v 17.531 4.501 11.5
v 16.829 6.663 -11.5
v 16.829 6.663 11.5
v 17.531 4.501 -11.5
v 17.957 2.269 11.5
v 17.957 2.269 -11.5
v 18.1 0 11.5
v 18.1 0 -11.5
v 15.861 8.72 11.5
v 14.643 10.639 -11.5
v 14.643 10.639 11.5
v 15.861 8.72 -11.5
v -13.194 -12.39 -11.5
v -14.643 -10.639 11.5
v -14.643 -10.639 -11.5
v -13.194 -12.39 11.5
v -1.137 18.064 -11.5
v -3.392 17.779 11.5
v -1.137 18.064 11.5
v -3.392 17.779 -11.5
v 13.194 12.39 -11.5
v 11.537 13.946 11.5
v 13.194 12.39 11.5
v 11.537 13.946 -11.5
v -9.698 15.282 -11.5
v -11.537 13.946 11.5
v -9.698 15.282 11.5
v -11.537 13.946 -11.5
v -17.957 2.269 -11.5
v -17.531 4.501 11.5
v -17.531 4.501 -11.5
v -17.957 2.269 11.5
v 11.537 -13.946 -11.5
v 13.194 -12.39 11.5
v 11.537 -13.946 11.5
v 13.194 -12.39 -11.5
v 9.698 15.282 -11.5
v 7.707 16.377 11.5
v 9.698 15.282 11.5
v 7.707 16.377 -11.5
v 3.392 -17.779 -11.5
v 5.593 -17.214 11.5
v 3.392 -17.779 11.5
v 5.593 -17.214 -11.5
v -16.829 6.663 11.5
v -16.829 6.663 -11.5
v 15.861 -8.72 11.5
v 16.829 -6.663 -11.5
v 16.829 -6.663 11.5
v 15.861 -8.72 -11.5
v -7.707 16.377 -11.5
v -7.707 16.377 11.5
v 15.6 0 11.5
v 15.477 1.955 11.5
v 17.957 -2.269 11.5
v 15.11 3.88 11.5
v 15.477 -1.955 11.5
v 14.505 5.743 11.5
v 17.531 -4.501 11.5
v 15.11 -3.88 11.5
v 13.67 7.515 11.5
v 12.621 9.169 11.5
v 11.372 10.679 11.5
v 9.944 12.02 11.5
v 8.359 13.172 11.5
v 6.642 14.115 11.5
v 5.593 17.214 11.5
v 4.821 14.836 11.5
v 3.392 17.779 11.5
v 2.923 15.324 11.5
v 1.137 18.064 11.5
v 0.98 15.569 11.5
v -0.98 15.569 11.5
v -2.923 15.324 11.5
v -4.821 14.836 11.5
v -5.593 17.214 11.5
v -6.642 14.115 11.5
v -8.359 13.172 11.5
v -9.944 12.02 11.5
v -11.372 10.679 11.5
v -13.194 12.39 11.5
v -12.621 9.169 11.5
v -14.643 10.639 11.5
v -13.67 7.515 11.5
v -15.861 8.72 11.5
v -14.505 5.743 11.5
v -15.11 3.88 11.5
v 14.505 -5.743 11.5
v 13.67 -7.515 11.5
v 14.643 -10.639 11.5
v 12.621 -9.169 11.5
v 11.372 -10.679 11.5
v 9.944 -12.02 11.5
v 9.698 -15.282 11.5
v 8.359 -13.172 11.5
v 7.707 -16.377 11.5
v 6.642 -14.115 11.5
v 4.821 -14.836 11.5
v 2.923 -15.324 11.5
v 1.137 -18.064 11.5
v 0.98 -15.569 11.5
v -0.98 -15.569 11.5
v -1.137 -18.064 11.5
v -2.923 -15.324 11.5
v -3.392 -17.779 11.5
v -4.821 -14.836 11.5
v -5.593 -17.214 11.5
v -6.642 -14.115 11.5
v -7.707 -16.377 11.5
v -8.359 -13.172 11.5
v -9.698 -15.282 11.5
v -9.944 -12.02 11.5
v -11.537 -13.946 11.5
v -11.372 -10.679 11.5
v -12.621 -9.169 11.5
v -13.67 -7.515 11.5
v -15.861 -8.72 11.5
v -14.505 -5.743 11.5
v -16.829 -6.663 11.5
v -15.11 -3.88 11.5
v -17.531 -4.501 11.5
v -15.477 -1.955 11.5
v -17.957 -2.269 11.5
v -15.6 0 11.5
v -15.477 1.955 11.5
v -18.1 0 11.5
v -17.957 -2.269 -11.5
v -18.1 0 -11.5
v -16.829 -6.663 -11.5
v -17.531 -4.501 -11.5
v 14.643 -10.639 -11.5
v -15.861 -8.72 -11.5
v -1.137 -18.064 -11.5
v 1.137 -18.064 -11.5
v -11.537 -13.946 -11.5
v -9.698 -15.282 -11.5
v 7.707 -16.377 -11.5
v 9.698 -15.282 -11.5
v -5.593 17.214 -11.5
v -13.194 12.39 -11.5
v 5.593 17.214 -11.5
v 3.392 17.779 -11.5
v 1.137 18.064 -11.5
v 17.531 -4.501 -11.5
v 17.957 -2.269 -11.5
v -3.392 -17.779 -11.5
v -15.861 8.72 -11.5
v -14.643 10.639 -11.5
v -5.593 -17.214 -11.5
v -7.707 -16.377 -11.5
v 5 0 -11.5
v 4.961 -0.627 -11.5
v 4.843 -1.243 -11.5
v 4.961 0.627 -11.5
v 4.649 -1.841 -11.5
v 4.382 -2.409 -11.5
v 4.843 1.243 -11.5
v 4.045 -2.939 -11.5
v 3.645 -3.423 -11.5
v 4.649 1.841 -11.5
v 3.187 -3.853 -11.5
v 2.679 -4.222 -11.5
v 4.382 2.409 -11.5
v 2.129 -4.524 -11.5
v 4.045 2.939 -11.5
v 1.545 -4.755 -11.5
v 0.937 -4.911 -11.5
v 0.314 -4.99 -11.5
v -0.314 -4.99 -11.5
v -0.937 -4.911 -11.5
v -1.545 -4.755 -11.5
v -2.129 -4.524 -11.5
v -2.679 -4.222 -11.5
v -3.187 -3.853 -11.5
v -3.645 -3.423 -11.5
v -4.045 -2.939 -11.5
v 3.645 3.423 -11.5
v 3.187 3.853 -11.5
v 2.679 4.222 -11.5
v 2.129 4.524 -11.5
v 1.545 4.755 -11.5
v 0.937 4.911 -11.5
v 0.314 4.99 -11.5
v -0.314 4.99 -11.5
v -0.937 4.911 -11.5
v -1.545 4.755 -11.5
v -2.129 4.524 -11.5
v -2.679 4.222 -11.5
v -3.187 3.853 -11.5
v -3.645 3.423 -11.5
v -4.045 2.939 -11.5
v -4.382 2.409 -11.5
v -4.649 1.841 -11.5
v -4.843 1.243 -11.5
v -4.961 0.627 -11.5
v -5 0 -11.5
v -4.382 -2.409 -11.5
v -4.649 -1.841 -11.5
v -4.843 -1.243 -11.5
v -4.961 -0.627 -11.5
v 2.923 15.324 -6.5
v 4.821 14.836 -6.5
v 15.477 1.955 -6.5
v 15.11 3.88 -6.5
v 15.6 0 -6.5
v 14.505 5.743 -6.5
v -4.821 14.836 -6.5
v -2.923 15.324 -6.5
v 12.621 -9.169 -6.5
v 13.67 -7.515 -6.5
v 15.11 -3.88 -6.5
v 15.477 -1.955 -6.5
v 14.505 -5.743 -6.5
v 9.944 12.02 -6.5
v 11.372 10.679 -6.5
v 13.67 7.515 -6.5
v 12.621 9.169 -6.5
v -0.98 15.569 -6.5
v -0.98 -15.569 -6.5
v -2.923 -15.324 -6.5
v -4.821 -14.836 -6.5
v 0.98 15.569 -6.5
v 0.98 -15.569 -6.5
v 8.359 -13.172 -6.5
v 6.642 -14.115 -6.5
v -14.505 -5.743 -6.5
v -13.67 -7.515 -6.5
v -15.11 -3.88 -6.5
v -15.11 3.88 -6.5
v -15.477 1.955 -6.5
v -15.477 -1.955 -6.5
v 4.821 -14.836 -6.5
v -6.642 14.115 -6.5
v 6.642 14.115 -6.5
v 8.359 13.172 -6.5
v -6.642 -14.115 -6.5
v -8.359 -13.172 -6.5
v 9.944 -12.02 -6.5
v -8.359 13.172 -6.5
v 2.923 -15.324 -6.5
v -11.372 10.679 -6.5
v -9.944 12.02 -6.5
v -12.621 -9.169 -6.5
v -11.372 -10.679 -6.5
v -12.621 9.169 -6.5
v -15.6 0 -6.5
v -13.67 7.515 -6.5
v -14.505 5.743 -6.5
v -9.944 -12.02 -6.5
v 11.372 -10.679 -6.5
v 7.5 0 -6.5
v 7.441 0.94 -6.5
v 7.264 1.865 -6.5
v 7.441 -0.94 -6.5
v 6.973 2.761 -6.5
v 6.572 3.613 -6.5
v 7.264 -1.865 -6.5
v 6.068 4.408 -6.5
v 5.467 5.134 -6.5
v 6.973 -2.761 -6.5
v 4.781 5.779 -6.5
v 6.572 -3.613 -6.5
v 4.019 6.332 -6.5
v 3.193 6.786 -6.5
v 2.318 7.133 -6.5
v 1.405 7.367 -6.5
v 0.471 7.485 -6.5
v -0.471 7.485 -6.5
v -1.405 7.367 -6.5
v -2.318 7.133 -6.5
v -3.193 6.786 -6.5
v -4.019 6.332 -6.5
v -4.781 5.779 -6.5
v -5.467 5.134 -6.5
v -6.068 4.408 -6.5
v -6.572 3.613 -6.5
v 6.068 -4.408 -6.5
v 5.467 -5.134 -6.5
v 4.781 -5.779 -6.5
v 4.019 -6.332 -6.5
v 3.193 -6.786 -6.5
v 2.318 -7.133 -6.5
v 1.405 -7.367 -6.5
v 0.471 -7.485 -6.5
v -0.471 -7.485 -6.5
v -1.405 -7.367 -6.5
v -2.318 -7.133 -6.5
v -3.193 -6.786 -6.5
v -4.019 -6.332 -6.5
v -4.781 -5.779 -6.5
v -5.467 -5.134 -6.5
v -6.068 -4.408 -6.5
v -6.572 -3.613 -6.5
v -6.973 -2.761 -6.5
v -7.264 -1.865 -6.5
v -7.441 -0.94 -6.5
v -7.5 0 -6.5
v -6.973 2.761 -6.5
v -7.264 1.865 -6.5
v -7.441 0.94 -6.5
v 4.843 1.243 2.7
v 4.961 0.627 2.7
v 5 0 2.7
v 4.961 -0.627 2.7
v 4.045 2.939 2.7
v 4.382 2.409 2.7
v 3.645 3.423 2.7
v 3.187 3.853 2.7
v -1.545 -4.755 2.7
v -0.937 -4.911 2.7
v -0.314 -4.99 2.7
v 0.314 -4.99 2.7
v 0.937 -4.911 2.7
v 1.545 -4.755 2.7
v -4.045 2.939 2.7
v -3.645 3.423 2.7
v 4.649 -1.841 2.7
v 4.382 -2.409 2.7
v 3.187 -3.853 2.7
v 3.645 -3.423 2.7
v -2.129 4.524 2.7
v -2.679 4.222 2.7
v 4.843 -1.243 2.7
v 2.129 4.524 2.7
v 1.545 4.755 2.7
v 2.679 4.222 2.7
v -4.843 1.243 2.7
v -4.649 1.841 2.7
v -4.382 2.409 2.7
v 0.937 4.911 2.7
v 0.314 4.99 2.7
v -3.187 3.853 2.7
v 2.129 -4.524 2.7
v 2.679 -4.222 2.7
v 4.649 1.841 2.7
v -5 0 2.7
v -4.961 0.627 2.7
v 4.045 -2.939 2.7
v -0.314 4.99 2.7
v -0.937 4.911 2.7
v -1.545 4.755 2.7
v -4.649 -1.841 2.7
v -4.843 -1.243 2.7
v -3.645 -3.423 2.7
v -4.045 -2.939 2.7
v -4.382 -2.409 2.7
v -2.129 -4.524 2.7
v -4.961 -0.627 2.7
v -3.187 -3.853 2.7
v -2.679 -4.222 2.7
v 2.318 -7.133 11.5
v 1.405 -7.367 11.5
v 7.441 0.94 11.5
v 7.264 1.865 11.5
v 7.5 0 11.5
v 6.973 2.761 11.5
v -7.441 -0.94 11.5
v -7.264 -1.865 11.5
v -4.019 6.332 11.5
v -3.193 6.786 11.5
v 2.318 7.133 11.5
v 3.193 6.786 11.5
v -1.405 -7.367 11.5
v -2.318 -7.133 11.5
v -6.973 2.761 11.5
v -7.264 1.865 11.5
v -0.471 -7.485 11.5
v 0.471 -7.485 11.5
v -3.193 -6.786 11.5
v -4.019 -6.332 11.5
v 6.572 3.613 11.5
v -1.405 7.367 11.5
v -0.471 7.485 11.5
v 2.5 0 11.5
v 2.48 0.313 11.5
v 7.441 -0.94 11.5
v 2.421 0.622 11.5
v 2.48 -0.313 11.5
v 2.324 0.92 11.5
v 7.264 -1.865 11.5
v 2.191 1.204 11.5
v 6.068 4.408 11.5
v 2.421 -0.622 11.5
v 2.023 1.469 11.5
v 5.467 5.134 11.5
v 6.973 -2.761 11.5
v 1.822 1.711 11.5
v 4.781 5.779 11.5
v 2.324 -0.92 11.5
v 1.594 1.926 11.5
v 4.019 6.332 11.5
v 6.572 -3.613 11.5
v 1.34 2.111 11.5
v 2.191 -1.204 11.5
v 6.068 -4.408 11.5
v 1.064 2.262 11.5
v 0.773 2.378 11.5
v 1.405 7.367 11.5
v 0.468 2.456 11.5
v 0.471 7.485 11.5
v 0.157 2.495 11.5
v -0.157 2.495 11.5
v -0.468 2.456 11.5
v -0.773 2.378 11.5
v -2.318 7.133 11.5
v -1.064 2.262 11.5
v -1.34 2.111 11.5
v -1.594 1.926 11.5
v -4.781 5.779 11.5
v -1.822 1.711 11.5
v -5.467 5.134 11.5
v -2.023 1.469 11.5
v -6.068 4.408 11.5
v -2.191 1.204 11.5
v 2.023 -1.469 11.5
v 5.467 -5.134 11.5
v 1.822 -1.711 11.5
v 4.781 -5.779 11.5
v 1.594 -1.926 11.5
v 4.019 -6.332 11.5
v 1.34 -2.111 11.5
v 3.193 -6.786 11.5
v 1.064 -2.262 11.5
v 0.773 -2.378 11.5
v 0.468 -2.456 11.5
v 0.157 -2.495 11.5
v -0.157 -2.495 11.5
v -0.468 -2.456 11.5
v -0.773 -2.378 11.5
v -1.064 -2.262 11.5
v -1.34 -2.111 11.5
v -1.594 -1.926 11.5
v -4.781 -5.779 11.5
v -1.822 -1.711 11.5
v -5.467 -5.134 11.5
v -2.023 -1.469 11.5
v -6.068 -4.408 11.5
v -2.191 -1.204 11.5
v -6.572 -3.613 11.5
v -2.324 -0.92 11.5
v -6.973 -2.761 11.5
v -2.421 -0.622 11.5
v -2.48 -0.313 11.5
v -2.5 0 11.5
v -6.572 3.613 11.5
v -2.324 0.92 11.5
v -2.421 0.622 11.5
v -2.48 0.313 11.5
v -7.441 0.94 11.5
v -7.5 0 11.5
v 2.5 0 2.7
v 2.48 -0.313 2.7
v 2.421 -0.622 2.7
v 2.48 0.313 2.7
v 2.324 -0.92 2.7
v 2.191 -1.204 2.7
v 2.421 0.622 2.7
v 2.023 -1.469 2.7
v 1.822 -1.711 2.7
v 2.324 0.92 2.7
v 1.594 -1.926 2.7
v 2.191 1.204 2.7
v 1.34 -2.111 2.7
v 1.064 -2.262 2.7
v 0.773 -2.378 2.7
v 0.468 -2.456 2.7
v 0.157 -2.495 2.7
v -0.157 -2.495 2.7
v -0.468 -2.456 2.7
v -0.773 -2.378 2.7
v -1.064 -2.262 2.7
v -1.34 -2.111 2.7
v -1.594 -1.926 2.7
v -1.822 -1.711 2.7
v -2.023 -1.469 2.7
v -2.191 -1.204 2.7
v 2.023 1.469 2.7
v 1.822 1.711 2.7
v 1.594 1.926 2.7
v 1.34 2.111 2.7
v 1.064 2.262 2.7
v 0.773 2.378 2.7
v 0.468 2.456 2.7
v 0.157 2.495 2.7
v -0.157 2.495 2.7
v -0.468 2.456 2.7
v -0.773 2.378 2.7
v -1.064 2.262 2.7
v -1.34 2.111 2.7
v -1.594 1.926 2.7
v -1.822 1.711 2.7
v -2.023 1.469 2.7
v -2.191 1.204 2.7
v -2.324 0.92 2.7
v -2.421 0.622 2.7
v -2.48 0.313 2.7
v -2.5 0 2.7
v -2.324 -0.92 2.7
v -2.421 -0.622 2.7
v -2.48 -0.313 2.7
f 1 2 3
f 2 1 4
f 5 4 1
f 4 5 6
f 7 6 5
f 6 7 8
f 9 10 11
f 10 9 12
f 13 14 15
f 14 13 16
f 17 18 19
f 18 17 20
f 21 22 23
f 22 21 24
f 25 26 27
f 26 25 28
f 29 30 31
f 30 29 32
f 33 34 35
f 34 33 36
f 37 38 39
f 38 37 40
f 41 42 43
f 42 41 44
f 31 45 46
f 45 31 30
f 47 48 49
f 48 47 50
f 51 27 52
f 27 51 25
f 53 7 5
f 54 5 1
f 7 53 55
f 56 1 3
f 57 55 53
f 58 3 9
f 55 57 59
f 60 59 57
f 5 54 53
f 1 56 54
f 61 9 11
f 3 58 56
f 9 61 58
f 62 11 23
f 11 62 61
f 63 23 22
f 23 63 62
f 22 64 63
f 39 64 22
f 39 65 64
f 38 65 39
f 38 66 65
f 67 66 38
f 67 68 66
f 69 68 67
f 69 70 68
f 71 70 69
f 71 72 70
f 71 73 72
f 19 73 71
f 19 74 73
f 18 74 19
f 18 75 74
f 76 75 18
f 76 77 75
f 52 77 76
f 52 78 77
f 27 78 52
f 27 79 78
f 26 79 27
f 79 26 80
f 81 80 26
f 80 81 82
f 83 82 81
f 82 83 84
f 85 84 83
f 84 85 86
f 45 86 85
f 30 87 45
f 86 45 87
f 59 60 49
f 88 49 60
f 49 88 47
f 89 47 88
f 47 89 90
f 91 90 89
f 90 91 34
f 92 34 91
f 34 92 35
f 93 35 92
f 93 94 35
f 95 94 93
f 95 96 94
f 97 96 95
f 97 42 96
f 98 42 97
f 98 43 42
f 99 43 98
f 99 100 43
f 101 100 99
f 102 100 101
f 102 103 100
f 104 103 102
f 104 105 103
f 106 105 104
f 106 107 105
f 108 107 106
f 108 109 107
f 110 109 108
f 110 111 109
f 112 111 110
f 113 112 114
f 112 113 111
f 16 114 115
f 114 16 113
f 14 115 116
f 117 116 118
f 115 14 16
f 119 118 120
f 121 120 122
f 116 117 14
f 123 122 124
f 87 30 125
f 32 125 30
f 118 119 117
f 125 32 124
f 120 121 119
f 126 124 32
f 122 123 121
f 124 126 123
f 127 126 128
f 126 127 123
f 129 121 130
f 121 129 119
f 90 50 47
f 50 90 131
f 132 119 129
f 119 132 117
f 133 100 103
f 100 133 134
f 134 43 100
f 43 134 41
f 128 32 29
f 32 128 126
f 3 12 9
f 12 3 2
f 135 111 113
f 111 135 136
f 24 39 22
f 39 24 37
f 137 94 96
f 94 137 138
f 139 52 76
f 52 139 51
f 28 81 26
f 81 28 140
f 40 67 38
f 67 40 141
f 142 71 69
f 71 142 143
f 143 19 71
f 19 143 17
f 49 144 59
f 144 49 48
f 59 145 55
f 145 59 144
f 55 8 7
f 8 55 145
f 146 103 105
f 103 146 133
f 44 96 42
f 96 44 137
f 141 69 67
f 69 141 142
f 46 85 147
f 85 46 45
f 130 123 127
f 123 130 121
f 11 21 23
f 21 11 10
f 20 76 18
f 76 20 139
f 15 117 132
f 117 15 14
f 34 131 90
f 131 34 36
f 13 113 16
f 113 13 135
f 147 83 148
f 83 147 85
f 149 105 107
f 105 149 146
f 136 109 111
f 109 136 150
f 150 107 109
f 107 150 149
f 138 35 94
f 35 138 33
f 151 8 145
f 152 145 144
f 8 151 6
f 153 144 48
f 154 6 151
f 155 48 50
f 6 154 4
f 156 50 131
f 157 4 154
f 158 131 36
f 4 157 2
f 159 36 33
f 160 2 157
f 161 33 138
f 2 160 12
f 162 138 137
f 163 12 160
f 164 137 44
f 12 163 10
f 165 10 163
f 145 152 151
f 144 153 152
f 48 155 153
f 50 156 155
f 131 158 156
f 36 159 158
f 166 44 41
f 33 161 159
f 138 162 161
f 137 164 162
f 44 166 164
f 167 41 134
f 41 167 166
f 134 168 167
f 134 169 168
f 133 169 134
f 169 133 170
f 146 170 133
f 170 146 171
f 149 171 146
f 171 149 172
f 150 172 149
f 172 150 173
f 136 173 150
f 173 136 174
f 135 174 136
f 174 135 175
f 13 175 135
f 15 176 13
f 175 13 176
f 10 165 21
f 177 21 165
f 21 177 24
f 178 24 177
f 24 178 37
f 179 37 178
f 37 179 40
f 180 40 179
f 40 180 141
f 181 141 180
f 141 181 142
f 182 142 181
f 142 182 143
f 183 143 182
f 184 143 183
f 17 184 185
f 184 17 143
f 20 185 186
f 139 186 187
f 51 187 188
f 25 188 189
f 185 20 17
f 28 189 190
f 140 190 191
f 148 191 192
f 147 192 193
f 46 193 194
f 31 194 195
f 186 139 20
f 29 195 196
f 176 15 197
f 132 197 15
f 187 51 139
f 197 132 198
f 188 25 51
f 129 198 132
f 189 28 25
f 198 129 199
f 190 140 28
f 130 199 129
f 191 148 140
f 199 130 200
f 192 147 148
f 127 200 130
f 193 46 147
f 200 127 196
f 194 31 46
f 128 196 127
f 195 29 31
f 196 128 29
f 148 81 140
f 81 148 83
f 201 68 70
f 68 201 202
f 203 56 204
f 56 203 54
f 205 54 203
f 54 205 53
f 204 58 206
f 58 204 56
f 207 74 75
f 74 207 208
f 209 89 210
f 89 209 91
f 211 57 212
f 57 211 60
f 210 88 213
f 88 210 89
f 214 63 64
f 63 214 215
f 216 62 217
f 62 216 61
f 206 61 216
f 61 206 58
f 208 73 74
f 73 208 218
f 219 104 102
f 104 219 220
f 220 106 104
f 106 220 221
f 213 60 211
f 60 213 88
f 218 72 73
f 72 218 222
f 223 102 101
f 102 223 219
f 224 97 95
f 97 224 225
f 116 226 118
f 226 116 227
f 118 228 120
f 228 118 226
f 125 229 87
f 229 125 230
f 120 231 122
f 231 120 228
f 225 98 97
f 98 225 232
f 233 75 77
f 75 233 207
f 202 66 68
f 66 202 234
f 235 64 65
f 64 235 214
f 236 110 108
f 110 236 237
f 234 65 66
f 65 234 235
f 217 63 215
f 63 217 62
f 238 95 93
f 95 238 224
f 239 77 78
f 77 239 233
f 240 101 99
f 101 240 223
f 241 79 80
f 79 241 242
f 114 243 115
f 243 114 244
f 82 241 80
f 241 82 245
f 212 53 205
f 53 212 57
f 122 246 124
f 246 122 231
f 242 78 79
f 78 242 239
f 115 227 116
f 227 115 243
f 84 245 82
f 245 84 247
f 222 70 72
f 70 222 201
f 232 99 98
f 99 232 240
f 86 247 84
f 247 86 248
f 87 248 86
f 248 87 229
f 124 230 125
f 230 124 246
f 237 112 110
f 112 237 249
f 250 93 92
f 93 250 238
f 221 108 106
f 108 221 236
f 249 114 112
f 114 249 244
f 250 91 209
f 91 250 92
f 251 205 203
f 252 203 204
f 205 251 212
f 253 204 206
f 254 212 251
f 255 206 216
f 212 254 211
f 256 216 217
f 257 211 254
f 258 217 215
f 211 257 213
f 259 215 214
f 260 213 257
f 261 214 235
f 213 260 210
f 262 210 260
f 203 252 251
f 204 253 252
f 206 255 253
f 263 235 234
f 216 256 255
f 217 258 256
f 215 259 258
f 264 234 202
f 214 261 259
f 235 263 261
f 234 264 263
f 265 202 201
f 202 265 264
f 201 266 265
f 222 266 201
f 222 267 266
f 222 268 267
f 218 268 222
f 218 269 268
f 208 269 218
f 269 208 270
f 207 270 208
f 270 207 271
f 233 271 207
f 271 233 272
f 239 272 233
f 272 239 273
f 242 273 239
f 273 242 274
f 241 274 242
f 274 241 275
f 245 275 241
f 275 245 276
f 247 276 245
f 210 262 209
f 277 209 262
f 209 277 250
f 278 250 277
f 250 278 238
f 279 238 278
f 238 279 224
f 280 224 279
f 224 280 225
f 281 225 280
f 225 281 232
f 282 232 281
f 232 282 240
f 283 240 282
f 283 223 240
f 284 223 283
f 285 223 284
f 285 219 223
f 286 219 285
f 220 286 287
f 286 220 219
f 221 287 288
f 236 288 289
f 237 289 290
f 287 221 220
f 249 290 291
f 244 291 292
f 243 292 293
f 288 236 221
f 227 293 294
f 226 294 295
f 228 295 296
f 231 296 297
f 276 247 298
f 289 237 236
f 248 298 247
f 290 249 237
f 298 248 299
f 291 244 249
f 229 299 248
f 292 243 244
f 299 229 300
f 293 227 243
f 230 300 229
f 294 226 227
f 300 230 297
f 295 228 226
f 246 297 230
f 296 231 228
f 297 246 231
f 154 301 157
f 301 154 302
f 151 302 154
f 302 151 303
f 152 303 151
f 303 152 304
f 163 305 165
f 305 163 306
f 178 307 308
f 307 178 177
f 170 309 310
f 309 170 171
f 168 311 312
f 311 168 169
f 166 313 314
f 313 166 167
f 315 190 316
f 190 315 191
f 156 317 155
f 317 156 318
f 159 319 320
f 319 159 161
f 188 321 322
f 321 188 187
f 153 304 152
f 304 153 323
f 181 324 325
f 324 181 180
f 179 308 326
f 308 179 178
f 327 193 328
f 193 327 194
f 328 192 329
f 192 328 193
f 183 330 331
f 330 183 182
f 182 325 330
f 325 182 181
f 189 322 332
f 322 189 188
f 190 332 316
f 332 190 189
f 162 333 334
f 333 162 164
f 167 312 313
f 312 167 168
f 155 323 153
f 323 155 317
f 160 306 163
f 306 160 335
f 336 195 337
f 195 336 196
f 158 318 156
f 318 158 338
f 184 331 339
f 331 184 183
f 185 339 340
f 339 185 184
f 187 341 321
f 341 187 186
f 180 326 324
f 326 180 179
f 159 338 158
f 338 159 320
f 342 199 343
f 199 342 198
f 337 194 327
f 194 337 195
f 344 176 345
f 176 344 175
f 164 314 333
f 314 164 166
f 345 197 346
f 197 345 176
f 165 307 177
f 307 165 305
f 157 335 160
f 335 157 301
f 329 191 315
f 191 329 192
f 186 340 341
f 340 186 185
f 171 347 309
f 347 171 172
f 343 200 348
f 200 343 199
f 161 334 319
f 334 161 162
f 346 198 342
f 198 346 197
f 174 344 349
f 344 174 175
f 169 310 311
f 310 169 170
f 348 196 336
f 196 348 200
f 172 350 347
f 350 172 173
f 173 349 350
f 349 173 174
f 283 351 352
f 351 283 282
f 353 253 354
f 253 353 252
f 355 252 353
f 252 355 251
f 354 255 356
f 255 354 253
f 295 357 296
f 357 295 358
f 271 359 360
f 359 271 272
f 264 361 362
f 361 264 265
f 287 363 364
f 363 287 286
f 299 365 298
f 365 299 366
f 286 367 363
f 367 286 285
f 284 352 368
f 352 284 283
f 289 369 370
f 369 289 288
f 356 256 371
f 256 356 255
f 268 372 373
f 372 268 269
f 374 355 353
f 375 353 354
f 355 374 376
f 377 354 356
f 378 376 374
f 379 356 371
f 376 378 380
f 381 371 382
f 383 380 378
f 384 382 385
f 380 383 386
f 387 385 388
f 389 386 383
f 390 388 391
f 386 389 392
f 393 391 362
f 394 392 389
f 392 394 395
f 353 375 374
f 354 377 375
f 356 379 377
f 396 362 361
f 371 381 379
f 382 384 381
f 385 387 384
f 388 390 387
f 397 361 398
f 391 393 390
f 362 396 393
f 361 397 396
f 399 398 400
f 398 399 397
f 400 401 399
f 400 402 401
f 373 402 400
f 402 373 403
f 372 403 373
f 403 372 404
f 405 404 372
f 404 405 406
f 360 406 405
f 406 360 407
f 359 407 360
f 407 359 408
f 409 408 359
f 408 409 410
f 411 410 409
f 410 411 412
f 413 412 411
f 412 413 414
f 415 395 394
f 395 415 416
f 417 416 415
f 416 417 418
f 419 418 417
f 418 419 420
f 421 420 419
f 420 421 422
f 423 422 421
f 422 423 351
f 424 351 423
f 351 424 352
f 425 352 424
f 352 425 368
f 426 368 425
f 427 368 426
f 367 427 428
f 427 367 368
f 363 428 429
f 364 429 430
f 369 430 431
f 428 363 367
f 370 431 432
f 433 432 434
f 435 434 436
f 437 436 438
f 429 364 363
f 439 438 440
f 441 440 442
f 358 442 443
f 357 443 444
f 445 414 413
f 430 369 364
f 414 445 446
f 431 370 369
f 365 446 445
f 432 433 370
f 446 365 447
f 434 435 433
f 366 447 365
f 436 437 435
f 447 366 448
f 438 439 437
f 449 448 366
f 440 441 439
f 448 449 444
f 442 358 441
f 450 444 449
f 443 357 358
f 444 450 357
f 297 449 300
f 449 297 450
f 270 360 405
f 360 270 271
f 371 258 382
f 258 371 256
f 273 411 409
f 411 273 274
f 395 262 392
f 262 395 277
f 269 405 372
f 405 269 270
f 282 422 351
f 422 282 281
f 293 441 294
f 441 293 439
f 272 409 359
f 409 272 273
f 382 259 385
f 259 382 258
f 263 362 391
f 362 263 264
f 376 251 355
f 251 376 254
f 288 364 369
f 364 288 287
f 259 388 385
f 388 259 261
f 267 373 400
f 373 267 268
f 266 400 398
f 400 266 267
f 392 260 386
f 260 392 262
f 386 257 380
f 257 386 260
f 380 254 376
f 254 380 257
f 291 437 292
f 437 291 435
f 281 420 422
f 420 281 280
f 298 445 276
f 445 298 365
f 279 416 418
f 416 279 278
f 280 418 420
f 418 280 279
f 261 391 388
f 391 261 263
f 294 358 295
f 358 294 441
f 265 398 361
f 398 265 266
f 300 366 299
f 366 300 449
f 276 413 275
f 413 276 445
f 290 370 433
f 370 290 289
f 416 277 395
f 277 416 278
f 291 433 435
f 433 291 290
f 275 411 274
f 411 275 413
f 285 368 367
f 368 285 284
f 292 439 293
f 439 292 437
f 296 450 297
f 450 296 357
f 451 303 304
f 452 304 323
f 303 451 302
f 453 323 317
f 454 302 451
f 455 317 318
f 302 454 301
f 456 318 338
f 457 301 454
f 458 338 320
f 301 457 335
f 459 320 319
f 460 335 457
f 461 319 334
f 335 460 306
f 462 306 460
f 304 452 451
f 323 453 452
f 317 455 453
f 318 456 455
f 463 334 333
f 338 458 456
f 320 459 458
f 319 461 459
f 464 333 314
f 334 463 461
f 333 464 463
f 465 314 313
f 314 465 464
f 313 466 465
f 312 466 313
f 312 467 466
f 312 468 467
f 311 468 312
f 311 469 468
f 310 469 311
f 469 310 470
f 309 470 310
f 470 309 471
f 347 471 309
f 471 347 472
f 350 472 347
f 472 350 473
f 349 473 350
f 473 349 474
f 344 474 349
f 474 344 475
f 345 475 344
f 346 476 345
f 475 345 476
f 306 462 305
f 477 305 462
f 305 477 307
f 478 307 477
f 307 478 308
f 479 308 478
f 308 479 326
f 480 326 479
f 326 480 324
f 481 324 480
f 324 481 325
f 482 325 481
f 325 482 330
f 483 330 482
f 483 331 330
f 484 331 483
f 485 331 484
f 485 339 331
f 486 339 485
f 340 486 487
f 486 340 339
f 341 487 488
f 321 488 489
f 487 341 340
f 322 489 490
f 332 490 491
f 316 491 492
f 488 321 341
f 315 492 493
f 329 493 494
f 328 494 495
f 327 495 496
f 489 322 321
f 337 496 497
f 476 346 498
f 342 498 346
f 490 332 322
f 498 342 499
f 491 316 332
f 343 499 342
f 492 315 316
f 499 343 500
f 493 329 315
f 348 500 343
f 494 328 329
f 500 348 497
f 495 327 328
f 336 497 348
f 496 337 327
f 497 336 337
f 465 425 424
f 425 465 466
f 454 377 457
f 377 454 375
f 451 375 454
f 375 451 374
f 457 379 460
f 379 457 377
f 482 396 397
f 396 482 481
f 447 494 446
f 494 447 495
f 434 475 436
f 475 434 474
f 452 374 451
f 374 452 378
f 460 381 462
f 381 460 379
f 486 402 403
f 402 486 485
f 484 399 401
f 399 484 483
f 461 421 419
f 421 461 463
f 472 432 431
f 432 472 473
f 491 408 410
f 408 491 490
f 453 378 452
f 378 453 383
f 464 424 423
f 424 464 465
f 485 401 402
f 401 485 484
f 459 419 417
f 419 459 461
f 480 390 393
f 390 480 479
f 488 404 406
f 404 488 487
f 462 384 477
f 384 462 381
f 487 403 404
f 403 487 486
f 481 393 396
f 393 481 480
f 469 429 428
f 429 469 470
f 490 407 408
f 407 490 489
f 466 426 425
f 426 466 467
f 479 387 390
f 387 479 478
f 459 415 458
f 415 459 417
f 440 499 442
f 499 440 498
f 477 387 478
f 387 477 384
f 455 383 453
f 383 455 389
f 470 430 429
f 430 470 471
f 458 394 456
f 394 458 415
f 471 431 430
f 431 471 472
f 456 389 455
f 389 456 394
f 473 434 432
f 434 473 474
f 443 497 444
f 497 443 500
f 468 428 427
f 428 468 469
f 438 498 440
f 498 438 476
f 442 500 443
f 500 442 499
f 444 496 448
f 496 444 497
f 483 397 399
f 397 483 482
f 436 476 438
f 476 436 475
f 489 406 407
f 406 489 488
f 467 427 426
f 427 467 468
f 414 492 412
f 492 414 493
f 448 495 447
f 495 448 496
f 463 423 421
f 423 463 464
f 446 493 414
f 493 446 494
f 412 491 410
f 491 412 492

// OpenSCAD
/* [Pad Dimensions] */
// - Length of the pad
pad_length = 23;
// - Diameter of the pad
pad_diameter = 36.2;
// - Diameter of the screw head
screw_head_diameter = 10;
// - Diameter of the screw shank
screw_shank_diameter = 5;
// - Length of the screw shank that would remain inside the pad
screw_shank_length = 8.8;
// - Thickness of the pad walls
wall_thickness = 5;

pad_with_screw_hole(pad_diameter, pad_length, wall_thickness, screw_head_diameter, screw_shank_diameter, screw_shank_length);

module pad_with_screw_hole(pad_diameter, pad_length, wall_thickness, screw_head_diameter, screw_shank_diameter, screw_shank_length) {
    union() {
        pad(pad_diameter, pad_length, wall_thickness, screw_head_diameter);
        screw_hole(screw_head_diameter, screw_shank_diameter, screw_shank_length, wall_thickness, pad_length);
    }
}

module pad(diameter, length, thickness, screw_head_diameter) {
    pad_bottom_thickness = thickness;
    union() {
        cylinder_with_hole(diameter - thickness, thickness, length);

        translate([0, 0, (-length + pad_bottom_thickness) / 2]) {
            cylinder_with_hole(screw_head_diameter, diameter - screw_head_diameter, pad_bottom_thickness);
        }
    }
}

module screw_hole(head_diameter, shank_diameter, shank_length, thickness, length) {
    outer_diameter = head_diameter + thickness;
    screw_head_container_length = length - shank_length;
    // Buffer to avoid a gap at the join
    screw_head_container_length_buffer = 2;
    
    shank_container_offset = (shank_length / 2) + (length / 2) - shank_length;
    screw_head_container_offset = (screw_head_container_length / 2) + (length / 2) - screw_head_container_length;

    translate([0, 0, shank_container_offset]) {
        cylinder_with_hole(shank_diameter, outer_diameter - shank_diameter, shank_length);
    }
    translate([0, 0, -screw_head_container_offset + (screw_head_container_length_buffer / 2)]) {
        cylinder_with_hole(head_diameter, outer_diameter - head_diameter, screw_head_container_length + screw_head_container_length_buffer);
    }
}

module cylinder_with_hole(hole_diameter, thickness, length) {
    difference() {
        cylinder(h = length, r = (hole_diameter + thickness) / 2, center = true, $fn = 50);
        cylinder(h = length + 2, r = hole_diameter / 2, center = true, $fn = 50);
    }
}
